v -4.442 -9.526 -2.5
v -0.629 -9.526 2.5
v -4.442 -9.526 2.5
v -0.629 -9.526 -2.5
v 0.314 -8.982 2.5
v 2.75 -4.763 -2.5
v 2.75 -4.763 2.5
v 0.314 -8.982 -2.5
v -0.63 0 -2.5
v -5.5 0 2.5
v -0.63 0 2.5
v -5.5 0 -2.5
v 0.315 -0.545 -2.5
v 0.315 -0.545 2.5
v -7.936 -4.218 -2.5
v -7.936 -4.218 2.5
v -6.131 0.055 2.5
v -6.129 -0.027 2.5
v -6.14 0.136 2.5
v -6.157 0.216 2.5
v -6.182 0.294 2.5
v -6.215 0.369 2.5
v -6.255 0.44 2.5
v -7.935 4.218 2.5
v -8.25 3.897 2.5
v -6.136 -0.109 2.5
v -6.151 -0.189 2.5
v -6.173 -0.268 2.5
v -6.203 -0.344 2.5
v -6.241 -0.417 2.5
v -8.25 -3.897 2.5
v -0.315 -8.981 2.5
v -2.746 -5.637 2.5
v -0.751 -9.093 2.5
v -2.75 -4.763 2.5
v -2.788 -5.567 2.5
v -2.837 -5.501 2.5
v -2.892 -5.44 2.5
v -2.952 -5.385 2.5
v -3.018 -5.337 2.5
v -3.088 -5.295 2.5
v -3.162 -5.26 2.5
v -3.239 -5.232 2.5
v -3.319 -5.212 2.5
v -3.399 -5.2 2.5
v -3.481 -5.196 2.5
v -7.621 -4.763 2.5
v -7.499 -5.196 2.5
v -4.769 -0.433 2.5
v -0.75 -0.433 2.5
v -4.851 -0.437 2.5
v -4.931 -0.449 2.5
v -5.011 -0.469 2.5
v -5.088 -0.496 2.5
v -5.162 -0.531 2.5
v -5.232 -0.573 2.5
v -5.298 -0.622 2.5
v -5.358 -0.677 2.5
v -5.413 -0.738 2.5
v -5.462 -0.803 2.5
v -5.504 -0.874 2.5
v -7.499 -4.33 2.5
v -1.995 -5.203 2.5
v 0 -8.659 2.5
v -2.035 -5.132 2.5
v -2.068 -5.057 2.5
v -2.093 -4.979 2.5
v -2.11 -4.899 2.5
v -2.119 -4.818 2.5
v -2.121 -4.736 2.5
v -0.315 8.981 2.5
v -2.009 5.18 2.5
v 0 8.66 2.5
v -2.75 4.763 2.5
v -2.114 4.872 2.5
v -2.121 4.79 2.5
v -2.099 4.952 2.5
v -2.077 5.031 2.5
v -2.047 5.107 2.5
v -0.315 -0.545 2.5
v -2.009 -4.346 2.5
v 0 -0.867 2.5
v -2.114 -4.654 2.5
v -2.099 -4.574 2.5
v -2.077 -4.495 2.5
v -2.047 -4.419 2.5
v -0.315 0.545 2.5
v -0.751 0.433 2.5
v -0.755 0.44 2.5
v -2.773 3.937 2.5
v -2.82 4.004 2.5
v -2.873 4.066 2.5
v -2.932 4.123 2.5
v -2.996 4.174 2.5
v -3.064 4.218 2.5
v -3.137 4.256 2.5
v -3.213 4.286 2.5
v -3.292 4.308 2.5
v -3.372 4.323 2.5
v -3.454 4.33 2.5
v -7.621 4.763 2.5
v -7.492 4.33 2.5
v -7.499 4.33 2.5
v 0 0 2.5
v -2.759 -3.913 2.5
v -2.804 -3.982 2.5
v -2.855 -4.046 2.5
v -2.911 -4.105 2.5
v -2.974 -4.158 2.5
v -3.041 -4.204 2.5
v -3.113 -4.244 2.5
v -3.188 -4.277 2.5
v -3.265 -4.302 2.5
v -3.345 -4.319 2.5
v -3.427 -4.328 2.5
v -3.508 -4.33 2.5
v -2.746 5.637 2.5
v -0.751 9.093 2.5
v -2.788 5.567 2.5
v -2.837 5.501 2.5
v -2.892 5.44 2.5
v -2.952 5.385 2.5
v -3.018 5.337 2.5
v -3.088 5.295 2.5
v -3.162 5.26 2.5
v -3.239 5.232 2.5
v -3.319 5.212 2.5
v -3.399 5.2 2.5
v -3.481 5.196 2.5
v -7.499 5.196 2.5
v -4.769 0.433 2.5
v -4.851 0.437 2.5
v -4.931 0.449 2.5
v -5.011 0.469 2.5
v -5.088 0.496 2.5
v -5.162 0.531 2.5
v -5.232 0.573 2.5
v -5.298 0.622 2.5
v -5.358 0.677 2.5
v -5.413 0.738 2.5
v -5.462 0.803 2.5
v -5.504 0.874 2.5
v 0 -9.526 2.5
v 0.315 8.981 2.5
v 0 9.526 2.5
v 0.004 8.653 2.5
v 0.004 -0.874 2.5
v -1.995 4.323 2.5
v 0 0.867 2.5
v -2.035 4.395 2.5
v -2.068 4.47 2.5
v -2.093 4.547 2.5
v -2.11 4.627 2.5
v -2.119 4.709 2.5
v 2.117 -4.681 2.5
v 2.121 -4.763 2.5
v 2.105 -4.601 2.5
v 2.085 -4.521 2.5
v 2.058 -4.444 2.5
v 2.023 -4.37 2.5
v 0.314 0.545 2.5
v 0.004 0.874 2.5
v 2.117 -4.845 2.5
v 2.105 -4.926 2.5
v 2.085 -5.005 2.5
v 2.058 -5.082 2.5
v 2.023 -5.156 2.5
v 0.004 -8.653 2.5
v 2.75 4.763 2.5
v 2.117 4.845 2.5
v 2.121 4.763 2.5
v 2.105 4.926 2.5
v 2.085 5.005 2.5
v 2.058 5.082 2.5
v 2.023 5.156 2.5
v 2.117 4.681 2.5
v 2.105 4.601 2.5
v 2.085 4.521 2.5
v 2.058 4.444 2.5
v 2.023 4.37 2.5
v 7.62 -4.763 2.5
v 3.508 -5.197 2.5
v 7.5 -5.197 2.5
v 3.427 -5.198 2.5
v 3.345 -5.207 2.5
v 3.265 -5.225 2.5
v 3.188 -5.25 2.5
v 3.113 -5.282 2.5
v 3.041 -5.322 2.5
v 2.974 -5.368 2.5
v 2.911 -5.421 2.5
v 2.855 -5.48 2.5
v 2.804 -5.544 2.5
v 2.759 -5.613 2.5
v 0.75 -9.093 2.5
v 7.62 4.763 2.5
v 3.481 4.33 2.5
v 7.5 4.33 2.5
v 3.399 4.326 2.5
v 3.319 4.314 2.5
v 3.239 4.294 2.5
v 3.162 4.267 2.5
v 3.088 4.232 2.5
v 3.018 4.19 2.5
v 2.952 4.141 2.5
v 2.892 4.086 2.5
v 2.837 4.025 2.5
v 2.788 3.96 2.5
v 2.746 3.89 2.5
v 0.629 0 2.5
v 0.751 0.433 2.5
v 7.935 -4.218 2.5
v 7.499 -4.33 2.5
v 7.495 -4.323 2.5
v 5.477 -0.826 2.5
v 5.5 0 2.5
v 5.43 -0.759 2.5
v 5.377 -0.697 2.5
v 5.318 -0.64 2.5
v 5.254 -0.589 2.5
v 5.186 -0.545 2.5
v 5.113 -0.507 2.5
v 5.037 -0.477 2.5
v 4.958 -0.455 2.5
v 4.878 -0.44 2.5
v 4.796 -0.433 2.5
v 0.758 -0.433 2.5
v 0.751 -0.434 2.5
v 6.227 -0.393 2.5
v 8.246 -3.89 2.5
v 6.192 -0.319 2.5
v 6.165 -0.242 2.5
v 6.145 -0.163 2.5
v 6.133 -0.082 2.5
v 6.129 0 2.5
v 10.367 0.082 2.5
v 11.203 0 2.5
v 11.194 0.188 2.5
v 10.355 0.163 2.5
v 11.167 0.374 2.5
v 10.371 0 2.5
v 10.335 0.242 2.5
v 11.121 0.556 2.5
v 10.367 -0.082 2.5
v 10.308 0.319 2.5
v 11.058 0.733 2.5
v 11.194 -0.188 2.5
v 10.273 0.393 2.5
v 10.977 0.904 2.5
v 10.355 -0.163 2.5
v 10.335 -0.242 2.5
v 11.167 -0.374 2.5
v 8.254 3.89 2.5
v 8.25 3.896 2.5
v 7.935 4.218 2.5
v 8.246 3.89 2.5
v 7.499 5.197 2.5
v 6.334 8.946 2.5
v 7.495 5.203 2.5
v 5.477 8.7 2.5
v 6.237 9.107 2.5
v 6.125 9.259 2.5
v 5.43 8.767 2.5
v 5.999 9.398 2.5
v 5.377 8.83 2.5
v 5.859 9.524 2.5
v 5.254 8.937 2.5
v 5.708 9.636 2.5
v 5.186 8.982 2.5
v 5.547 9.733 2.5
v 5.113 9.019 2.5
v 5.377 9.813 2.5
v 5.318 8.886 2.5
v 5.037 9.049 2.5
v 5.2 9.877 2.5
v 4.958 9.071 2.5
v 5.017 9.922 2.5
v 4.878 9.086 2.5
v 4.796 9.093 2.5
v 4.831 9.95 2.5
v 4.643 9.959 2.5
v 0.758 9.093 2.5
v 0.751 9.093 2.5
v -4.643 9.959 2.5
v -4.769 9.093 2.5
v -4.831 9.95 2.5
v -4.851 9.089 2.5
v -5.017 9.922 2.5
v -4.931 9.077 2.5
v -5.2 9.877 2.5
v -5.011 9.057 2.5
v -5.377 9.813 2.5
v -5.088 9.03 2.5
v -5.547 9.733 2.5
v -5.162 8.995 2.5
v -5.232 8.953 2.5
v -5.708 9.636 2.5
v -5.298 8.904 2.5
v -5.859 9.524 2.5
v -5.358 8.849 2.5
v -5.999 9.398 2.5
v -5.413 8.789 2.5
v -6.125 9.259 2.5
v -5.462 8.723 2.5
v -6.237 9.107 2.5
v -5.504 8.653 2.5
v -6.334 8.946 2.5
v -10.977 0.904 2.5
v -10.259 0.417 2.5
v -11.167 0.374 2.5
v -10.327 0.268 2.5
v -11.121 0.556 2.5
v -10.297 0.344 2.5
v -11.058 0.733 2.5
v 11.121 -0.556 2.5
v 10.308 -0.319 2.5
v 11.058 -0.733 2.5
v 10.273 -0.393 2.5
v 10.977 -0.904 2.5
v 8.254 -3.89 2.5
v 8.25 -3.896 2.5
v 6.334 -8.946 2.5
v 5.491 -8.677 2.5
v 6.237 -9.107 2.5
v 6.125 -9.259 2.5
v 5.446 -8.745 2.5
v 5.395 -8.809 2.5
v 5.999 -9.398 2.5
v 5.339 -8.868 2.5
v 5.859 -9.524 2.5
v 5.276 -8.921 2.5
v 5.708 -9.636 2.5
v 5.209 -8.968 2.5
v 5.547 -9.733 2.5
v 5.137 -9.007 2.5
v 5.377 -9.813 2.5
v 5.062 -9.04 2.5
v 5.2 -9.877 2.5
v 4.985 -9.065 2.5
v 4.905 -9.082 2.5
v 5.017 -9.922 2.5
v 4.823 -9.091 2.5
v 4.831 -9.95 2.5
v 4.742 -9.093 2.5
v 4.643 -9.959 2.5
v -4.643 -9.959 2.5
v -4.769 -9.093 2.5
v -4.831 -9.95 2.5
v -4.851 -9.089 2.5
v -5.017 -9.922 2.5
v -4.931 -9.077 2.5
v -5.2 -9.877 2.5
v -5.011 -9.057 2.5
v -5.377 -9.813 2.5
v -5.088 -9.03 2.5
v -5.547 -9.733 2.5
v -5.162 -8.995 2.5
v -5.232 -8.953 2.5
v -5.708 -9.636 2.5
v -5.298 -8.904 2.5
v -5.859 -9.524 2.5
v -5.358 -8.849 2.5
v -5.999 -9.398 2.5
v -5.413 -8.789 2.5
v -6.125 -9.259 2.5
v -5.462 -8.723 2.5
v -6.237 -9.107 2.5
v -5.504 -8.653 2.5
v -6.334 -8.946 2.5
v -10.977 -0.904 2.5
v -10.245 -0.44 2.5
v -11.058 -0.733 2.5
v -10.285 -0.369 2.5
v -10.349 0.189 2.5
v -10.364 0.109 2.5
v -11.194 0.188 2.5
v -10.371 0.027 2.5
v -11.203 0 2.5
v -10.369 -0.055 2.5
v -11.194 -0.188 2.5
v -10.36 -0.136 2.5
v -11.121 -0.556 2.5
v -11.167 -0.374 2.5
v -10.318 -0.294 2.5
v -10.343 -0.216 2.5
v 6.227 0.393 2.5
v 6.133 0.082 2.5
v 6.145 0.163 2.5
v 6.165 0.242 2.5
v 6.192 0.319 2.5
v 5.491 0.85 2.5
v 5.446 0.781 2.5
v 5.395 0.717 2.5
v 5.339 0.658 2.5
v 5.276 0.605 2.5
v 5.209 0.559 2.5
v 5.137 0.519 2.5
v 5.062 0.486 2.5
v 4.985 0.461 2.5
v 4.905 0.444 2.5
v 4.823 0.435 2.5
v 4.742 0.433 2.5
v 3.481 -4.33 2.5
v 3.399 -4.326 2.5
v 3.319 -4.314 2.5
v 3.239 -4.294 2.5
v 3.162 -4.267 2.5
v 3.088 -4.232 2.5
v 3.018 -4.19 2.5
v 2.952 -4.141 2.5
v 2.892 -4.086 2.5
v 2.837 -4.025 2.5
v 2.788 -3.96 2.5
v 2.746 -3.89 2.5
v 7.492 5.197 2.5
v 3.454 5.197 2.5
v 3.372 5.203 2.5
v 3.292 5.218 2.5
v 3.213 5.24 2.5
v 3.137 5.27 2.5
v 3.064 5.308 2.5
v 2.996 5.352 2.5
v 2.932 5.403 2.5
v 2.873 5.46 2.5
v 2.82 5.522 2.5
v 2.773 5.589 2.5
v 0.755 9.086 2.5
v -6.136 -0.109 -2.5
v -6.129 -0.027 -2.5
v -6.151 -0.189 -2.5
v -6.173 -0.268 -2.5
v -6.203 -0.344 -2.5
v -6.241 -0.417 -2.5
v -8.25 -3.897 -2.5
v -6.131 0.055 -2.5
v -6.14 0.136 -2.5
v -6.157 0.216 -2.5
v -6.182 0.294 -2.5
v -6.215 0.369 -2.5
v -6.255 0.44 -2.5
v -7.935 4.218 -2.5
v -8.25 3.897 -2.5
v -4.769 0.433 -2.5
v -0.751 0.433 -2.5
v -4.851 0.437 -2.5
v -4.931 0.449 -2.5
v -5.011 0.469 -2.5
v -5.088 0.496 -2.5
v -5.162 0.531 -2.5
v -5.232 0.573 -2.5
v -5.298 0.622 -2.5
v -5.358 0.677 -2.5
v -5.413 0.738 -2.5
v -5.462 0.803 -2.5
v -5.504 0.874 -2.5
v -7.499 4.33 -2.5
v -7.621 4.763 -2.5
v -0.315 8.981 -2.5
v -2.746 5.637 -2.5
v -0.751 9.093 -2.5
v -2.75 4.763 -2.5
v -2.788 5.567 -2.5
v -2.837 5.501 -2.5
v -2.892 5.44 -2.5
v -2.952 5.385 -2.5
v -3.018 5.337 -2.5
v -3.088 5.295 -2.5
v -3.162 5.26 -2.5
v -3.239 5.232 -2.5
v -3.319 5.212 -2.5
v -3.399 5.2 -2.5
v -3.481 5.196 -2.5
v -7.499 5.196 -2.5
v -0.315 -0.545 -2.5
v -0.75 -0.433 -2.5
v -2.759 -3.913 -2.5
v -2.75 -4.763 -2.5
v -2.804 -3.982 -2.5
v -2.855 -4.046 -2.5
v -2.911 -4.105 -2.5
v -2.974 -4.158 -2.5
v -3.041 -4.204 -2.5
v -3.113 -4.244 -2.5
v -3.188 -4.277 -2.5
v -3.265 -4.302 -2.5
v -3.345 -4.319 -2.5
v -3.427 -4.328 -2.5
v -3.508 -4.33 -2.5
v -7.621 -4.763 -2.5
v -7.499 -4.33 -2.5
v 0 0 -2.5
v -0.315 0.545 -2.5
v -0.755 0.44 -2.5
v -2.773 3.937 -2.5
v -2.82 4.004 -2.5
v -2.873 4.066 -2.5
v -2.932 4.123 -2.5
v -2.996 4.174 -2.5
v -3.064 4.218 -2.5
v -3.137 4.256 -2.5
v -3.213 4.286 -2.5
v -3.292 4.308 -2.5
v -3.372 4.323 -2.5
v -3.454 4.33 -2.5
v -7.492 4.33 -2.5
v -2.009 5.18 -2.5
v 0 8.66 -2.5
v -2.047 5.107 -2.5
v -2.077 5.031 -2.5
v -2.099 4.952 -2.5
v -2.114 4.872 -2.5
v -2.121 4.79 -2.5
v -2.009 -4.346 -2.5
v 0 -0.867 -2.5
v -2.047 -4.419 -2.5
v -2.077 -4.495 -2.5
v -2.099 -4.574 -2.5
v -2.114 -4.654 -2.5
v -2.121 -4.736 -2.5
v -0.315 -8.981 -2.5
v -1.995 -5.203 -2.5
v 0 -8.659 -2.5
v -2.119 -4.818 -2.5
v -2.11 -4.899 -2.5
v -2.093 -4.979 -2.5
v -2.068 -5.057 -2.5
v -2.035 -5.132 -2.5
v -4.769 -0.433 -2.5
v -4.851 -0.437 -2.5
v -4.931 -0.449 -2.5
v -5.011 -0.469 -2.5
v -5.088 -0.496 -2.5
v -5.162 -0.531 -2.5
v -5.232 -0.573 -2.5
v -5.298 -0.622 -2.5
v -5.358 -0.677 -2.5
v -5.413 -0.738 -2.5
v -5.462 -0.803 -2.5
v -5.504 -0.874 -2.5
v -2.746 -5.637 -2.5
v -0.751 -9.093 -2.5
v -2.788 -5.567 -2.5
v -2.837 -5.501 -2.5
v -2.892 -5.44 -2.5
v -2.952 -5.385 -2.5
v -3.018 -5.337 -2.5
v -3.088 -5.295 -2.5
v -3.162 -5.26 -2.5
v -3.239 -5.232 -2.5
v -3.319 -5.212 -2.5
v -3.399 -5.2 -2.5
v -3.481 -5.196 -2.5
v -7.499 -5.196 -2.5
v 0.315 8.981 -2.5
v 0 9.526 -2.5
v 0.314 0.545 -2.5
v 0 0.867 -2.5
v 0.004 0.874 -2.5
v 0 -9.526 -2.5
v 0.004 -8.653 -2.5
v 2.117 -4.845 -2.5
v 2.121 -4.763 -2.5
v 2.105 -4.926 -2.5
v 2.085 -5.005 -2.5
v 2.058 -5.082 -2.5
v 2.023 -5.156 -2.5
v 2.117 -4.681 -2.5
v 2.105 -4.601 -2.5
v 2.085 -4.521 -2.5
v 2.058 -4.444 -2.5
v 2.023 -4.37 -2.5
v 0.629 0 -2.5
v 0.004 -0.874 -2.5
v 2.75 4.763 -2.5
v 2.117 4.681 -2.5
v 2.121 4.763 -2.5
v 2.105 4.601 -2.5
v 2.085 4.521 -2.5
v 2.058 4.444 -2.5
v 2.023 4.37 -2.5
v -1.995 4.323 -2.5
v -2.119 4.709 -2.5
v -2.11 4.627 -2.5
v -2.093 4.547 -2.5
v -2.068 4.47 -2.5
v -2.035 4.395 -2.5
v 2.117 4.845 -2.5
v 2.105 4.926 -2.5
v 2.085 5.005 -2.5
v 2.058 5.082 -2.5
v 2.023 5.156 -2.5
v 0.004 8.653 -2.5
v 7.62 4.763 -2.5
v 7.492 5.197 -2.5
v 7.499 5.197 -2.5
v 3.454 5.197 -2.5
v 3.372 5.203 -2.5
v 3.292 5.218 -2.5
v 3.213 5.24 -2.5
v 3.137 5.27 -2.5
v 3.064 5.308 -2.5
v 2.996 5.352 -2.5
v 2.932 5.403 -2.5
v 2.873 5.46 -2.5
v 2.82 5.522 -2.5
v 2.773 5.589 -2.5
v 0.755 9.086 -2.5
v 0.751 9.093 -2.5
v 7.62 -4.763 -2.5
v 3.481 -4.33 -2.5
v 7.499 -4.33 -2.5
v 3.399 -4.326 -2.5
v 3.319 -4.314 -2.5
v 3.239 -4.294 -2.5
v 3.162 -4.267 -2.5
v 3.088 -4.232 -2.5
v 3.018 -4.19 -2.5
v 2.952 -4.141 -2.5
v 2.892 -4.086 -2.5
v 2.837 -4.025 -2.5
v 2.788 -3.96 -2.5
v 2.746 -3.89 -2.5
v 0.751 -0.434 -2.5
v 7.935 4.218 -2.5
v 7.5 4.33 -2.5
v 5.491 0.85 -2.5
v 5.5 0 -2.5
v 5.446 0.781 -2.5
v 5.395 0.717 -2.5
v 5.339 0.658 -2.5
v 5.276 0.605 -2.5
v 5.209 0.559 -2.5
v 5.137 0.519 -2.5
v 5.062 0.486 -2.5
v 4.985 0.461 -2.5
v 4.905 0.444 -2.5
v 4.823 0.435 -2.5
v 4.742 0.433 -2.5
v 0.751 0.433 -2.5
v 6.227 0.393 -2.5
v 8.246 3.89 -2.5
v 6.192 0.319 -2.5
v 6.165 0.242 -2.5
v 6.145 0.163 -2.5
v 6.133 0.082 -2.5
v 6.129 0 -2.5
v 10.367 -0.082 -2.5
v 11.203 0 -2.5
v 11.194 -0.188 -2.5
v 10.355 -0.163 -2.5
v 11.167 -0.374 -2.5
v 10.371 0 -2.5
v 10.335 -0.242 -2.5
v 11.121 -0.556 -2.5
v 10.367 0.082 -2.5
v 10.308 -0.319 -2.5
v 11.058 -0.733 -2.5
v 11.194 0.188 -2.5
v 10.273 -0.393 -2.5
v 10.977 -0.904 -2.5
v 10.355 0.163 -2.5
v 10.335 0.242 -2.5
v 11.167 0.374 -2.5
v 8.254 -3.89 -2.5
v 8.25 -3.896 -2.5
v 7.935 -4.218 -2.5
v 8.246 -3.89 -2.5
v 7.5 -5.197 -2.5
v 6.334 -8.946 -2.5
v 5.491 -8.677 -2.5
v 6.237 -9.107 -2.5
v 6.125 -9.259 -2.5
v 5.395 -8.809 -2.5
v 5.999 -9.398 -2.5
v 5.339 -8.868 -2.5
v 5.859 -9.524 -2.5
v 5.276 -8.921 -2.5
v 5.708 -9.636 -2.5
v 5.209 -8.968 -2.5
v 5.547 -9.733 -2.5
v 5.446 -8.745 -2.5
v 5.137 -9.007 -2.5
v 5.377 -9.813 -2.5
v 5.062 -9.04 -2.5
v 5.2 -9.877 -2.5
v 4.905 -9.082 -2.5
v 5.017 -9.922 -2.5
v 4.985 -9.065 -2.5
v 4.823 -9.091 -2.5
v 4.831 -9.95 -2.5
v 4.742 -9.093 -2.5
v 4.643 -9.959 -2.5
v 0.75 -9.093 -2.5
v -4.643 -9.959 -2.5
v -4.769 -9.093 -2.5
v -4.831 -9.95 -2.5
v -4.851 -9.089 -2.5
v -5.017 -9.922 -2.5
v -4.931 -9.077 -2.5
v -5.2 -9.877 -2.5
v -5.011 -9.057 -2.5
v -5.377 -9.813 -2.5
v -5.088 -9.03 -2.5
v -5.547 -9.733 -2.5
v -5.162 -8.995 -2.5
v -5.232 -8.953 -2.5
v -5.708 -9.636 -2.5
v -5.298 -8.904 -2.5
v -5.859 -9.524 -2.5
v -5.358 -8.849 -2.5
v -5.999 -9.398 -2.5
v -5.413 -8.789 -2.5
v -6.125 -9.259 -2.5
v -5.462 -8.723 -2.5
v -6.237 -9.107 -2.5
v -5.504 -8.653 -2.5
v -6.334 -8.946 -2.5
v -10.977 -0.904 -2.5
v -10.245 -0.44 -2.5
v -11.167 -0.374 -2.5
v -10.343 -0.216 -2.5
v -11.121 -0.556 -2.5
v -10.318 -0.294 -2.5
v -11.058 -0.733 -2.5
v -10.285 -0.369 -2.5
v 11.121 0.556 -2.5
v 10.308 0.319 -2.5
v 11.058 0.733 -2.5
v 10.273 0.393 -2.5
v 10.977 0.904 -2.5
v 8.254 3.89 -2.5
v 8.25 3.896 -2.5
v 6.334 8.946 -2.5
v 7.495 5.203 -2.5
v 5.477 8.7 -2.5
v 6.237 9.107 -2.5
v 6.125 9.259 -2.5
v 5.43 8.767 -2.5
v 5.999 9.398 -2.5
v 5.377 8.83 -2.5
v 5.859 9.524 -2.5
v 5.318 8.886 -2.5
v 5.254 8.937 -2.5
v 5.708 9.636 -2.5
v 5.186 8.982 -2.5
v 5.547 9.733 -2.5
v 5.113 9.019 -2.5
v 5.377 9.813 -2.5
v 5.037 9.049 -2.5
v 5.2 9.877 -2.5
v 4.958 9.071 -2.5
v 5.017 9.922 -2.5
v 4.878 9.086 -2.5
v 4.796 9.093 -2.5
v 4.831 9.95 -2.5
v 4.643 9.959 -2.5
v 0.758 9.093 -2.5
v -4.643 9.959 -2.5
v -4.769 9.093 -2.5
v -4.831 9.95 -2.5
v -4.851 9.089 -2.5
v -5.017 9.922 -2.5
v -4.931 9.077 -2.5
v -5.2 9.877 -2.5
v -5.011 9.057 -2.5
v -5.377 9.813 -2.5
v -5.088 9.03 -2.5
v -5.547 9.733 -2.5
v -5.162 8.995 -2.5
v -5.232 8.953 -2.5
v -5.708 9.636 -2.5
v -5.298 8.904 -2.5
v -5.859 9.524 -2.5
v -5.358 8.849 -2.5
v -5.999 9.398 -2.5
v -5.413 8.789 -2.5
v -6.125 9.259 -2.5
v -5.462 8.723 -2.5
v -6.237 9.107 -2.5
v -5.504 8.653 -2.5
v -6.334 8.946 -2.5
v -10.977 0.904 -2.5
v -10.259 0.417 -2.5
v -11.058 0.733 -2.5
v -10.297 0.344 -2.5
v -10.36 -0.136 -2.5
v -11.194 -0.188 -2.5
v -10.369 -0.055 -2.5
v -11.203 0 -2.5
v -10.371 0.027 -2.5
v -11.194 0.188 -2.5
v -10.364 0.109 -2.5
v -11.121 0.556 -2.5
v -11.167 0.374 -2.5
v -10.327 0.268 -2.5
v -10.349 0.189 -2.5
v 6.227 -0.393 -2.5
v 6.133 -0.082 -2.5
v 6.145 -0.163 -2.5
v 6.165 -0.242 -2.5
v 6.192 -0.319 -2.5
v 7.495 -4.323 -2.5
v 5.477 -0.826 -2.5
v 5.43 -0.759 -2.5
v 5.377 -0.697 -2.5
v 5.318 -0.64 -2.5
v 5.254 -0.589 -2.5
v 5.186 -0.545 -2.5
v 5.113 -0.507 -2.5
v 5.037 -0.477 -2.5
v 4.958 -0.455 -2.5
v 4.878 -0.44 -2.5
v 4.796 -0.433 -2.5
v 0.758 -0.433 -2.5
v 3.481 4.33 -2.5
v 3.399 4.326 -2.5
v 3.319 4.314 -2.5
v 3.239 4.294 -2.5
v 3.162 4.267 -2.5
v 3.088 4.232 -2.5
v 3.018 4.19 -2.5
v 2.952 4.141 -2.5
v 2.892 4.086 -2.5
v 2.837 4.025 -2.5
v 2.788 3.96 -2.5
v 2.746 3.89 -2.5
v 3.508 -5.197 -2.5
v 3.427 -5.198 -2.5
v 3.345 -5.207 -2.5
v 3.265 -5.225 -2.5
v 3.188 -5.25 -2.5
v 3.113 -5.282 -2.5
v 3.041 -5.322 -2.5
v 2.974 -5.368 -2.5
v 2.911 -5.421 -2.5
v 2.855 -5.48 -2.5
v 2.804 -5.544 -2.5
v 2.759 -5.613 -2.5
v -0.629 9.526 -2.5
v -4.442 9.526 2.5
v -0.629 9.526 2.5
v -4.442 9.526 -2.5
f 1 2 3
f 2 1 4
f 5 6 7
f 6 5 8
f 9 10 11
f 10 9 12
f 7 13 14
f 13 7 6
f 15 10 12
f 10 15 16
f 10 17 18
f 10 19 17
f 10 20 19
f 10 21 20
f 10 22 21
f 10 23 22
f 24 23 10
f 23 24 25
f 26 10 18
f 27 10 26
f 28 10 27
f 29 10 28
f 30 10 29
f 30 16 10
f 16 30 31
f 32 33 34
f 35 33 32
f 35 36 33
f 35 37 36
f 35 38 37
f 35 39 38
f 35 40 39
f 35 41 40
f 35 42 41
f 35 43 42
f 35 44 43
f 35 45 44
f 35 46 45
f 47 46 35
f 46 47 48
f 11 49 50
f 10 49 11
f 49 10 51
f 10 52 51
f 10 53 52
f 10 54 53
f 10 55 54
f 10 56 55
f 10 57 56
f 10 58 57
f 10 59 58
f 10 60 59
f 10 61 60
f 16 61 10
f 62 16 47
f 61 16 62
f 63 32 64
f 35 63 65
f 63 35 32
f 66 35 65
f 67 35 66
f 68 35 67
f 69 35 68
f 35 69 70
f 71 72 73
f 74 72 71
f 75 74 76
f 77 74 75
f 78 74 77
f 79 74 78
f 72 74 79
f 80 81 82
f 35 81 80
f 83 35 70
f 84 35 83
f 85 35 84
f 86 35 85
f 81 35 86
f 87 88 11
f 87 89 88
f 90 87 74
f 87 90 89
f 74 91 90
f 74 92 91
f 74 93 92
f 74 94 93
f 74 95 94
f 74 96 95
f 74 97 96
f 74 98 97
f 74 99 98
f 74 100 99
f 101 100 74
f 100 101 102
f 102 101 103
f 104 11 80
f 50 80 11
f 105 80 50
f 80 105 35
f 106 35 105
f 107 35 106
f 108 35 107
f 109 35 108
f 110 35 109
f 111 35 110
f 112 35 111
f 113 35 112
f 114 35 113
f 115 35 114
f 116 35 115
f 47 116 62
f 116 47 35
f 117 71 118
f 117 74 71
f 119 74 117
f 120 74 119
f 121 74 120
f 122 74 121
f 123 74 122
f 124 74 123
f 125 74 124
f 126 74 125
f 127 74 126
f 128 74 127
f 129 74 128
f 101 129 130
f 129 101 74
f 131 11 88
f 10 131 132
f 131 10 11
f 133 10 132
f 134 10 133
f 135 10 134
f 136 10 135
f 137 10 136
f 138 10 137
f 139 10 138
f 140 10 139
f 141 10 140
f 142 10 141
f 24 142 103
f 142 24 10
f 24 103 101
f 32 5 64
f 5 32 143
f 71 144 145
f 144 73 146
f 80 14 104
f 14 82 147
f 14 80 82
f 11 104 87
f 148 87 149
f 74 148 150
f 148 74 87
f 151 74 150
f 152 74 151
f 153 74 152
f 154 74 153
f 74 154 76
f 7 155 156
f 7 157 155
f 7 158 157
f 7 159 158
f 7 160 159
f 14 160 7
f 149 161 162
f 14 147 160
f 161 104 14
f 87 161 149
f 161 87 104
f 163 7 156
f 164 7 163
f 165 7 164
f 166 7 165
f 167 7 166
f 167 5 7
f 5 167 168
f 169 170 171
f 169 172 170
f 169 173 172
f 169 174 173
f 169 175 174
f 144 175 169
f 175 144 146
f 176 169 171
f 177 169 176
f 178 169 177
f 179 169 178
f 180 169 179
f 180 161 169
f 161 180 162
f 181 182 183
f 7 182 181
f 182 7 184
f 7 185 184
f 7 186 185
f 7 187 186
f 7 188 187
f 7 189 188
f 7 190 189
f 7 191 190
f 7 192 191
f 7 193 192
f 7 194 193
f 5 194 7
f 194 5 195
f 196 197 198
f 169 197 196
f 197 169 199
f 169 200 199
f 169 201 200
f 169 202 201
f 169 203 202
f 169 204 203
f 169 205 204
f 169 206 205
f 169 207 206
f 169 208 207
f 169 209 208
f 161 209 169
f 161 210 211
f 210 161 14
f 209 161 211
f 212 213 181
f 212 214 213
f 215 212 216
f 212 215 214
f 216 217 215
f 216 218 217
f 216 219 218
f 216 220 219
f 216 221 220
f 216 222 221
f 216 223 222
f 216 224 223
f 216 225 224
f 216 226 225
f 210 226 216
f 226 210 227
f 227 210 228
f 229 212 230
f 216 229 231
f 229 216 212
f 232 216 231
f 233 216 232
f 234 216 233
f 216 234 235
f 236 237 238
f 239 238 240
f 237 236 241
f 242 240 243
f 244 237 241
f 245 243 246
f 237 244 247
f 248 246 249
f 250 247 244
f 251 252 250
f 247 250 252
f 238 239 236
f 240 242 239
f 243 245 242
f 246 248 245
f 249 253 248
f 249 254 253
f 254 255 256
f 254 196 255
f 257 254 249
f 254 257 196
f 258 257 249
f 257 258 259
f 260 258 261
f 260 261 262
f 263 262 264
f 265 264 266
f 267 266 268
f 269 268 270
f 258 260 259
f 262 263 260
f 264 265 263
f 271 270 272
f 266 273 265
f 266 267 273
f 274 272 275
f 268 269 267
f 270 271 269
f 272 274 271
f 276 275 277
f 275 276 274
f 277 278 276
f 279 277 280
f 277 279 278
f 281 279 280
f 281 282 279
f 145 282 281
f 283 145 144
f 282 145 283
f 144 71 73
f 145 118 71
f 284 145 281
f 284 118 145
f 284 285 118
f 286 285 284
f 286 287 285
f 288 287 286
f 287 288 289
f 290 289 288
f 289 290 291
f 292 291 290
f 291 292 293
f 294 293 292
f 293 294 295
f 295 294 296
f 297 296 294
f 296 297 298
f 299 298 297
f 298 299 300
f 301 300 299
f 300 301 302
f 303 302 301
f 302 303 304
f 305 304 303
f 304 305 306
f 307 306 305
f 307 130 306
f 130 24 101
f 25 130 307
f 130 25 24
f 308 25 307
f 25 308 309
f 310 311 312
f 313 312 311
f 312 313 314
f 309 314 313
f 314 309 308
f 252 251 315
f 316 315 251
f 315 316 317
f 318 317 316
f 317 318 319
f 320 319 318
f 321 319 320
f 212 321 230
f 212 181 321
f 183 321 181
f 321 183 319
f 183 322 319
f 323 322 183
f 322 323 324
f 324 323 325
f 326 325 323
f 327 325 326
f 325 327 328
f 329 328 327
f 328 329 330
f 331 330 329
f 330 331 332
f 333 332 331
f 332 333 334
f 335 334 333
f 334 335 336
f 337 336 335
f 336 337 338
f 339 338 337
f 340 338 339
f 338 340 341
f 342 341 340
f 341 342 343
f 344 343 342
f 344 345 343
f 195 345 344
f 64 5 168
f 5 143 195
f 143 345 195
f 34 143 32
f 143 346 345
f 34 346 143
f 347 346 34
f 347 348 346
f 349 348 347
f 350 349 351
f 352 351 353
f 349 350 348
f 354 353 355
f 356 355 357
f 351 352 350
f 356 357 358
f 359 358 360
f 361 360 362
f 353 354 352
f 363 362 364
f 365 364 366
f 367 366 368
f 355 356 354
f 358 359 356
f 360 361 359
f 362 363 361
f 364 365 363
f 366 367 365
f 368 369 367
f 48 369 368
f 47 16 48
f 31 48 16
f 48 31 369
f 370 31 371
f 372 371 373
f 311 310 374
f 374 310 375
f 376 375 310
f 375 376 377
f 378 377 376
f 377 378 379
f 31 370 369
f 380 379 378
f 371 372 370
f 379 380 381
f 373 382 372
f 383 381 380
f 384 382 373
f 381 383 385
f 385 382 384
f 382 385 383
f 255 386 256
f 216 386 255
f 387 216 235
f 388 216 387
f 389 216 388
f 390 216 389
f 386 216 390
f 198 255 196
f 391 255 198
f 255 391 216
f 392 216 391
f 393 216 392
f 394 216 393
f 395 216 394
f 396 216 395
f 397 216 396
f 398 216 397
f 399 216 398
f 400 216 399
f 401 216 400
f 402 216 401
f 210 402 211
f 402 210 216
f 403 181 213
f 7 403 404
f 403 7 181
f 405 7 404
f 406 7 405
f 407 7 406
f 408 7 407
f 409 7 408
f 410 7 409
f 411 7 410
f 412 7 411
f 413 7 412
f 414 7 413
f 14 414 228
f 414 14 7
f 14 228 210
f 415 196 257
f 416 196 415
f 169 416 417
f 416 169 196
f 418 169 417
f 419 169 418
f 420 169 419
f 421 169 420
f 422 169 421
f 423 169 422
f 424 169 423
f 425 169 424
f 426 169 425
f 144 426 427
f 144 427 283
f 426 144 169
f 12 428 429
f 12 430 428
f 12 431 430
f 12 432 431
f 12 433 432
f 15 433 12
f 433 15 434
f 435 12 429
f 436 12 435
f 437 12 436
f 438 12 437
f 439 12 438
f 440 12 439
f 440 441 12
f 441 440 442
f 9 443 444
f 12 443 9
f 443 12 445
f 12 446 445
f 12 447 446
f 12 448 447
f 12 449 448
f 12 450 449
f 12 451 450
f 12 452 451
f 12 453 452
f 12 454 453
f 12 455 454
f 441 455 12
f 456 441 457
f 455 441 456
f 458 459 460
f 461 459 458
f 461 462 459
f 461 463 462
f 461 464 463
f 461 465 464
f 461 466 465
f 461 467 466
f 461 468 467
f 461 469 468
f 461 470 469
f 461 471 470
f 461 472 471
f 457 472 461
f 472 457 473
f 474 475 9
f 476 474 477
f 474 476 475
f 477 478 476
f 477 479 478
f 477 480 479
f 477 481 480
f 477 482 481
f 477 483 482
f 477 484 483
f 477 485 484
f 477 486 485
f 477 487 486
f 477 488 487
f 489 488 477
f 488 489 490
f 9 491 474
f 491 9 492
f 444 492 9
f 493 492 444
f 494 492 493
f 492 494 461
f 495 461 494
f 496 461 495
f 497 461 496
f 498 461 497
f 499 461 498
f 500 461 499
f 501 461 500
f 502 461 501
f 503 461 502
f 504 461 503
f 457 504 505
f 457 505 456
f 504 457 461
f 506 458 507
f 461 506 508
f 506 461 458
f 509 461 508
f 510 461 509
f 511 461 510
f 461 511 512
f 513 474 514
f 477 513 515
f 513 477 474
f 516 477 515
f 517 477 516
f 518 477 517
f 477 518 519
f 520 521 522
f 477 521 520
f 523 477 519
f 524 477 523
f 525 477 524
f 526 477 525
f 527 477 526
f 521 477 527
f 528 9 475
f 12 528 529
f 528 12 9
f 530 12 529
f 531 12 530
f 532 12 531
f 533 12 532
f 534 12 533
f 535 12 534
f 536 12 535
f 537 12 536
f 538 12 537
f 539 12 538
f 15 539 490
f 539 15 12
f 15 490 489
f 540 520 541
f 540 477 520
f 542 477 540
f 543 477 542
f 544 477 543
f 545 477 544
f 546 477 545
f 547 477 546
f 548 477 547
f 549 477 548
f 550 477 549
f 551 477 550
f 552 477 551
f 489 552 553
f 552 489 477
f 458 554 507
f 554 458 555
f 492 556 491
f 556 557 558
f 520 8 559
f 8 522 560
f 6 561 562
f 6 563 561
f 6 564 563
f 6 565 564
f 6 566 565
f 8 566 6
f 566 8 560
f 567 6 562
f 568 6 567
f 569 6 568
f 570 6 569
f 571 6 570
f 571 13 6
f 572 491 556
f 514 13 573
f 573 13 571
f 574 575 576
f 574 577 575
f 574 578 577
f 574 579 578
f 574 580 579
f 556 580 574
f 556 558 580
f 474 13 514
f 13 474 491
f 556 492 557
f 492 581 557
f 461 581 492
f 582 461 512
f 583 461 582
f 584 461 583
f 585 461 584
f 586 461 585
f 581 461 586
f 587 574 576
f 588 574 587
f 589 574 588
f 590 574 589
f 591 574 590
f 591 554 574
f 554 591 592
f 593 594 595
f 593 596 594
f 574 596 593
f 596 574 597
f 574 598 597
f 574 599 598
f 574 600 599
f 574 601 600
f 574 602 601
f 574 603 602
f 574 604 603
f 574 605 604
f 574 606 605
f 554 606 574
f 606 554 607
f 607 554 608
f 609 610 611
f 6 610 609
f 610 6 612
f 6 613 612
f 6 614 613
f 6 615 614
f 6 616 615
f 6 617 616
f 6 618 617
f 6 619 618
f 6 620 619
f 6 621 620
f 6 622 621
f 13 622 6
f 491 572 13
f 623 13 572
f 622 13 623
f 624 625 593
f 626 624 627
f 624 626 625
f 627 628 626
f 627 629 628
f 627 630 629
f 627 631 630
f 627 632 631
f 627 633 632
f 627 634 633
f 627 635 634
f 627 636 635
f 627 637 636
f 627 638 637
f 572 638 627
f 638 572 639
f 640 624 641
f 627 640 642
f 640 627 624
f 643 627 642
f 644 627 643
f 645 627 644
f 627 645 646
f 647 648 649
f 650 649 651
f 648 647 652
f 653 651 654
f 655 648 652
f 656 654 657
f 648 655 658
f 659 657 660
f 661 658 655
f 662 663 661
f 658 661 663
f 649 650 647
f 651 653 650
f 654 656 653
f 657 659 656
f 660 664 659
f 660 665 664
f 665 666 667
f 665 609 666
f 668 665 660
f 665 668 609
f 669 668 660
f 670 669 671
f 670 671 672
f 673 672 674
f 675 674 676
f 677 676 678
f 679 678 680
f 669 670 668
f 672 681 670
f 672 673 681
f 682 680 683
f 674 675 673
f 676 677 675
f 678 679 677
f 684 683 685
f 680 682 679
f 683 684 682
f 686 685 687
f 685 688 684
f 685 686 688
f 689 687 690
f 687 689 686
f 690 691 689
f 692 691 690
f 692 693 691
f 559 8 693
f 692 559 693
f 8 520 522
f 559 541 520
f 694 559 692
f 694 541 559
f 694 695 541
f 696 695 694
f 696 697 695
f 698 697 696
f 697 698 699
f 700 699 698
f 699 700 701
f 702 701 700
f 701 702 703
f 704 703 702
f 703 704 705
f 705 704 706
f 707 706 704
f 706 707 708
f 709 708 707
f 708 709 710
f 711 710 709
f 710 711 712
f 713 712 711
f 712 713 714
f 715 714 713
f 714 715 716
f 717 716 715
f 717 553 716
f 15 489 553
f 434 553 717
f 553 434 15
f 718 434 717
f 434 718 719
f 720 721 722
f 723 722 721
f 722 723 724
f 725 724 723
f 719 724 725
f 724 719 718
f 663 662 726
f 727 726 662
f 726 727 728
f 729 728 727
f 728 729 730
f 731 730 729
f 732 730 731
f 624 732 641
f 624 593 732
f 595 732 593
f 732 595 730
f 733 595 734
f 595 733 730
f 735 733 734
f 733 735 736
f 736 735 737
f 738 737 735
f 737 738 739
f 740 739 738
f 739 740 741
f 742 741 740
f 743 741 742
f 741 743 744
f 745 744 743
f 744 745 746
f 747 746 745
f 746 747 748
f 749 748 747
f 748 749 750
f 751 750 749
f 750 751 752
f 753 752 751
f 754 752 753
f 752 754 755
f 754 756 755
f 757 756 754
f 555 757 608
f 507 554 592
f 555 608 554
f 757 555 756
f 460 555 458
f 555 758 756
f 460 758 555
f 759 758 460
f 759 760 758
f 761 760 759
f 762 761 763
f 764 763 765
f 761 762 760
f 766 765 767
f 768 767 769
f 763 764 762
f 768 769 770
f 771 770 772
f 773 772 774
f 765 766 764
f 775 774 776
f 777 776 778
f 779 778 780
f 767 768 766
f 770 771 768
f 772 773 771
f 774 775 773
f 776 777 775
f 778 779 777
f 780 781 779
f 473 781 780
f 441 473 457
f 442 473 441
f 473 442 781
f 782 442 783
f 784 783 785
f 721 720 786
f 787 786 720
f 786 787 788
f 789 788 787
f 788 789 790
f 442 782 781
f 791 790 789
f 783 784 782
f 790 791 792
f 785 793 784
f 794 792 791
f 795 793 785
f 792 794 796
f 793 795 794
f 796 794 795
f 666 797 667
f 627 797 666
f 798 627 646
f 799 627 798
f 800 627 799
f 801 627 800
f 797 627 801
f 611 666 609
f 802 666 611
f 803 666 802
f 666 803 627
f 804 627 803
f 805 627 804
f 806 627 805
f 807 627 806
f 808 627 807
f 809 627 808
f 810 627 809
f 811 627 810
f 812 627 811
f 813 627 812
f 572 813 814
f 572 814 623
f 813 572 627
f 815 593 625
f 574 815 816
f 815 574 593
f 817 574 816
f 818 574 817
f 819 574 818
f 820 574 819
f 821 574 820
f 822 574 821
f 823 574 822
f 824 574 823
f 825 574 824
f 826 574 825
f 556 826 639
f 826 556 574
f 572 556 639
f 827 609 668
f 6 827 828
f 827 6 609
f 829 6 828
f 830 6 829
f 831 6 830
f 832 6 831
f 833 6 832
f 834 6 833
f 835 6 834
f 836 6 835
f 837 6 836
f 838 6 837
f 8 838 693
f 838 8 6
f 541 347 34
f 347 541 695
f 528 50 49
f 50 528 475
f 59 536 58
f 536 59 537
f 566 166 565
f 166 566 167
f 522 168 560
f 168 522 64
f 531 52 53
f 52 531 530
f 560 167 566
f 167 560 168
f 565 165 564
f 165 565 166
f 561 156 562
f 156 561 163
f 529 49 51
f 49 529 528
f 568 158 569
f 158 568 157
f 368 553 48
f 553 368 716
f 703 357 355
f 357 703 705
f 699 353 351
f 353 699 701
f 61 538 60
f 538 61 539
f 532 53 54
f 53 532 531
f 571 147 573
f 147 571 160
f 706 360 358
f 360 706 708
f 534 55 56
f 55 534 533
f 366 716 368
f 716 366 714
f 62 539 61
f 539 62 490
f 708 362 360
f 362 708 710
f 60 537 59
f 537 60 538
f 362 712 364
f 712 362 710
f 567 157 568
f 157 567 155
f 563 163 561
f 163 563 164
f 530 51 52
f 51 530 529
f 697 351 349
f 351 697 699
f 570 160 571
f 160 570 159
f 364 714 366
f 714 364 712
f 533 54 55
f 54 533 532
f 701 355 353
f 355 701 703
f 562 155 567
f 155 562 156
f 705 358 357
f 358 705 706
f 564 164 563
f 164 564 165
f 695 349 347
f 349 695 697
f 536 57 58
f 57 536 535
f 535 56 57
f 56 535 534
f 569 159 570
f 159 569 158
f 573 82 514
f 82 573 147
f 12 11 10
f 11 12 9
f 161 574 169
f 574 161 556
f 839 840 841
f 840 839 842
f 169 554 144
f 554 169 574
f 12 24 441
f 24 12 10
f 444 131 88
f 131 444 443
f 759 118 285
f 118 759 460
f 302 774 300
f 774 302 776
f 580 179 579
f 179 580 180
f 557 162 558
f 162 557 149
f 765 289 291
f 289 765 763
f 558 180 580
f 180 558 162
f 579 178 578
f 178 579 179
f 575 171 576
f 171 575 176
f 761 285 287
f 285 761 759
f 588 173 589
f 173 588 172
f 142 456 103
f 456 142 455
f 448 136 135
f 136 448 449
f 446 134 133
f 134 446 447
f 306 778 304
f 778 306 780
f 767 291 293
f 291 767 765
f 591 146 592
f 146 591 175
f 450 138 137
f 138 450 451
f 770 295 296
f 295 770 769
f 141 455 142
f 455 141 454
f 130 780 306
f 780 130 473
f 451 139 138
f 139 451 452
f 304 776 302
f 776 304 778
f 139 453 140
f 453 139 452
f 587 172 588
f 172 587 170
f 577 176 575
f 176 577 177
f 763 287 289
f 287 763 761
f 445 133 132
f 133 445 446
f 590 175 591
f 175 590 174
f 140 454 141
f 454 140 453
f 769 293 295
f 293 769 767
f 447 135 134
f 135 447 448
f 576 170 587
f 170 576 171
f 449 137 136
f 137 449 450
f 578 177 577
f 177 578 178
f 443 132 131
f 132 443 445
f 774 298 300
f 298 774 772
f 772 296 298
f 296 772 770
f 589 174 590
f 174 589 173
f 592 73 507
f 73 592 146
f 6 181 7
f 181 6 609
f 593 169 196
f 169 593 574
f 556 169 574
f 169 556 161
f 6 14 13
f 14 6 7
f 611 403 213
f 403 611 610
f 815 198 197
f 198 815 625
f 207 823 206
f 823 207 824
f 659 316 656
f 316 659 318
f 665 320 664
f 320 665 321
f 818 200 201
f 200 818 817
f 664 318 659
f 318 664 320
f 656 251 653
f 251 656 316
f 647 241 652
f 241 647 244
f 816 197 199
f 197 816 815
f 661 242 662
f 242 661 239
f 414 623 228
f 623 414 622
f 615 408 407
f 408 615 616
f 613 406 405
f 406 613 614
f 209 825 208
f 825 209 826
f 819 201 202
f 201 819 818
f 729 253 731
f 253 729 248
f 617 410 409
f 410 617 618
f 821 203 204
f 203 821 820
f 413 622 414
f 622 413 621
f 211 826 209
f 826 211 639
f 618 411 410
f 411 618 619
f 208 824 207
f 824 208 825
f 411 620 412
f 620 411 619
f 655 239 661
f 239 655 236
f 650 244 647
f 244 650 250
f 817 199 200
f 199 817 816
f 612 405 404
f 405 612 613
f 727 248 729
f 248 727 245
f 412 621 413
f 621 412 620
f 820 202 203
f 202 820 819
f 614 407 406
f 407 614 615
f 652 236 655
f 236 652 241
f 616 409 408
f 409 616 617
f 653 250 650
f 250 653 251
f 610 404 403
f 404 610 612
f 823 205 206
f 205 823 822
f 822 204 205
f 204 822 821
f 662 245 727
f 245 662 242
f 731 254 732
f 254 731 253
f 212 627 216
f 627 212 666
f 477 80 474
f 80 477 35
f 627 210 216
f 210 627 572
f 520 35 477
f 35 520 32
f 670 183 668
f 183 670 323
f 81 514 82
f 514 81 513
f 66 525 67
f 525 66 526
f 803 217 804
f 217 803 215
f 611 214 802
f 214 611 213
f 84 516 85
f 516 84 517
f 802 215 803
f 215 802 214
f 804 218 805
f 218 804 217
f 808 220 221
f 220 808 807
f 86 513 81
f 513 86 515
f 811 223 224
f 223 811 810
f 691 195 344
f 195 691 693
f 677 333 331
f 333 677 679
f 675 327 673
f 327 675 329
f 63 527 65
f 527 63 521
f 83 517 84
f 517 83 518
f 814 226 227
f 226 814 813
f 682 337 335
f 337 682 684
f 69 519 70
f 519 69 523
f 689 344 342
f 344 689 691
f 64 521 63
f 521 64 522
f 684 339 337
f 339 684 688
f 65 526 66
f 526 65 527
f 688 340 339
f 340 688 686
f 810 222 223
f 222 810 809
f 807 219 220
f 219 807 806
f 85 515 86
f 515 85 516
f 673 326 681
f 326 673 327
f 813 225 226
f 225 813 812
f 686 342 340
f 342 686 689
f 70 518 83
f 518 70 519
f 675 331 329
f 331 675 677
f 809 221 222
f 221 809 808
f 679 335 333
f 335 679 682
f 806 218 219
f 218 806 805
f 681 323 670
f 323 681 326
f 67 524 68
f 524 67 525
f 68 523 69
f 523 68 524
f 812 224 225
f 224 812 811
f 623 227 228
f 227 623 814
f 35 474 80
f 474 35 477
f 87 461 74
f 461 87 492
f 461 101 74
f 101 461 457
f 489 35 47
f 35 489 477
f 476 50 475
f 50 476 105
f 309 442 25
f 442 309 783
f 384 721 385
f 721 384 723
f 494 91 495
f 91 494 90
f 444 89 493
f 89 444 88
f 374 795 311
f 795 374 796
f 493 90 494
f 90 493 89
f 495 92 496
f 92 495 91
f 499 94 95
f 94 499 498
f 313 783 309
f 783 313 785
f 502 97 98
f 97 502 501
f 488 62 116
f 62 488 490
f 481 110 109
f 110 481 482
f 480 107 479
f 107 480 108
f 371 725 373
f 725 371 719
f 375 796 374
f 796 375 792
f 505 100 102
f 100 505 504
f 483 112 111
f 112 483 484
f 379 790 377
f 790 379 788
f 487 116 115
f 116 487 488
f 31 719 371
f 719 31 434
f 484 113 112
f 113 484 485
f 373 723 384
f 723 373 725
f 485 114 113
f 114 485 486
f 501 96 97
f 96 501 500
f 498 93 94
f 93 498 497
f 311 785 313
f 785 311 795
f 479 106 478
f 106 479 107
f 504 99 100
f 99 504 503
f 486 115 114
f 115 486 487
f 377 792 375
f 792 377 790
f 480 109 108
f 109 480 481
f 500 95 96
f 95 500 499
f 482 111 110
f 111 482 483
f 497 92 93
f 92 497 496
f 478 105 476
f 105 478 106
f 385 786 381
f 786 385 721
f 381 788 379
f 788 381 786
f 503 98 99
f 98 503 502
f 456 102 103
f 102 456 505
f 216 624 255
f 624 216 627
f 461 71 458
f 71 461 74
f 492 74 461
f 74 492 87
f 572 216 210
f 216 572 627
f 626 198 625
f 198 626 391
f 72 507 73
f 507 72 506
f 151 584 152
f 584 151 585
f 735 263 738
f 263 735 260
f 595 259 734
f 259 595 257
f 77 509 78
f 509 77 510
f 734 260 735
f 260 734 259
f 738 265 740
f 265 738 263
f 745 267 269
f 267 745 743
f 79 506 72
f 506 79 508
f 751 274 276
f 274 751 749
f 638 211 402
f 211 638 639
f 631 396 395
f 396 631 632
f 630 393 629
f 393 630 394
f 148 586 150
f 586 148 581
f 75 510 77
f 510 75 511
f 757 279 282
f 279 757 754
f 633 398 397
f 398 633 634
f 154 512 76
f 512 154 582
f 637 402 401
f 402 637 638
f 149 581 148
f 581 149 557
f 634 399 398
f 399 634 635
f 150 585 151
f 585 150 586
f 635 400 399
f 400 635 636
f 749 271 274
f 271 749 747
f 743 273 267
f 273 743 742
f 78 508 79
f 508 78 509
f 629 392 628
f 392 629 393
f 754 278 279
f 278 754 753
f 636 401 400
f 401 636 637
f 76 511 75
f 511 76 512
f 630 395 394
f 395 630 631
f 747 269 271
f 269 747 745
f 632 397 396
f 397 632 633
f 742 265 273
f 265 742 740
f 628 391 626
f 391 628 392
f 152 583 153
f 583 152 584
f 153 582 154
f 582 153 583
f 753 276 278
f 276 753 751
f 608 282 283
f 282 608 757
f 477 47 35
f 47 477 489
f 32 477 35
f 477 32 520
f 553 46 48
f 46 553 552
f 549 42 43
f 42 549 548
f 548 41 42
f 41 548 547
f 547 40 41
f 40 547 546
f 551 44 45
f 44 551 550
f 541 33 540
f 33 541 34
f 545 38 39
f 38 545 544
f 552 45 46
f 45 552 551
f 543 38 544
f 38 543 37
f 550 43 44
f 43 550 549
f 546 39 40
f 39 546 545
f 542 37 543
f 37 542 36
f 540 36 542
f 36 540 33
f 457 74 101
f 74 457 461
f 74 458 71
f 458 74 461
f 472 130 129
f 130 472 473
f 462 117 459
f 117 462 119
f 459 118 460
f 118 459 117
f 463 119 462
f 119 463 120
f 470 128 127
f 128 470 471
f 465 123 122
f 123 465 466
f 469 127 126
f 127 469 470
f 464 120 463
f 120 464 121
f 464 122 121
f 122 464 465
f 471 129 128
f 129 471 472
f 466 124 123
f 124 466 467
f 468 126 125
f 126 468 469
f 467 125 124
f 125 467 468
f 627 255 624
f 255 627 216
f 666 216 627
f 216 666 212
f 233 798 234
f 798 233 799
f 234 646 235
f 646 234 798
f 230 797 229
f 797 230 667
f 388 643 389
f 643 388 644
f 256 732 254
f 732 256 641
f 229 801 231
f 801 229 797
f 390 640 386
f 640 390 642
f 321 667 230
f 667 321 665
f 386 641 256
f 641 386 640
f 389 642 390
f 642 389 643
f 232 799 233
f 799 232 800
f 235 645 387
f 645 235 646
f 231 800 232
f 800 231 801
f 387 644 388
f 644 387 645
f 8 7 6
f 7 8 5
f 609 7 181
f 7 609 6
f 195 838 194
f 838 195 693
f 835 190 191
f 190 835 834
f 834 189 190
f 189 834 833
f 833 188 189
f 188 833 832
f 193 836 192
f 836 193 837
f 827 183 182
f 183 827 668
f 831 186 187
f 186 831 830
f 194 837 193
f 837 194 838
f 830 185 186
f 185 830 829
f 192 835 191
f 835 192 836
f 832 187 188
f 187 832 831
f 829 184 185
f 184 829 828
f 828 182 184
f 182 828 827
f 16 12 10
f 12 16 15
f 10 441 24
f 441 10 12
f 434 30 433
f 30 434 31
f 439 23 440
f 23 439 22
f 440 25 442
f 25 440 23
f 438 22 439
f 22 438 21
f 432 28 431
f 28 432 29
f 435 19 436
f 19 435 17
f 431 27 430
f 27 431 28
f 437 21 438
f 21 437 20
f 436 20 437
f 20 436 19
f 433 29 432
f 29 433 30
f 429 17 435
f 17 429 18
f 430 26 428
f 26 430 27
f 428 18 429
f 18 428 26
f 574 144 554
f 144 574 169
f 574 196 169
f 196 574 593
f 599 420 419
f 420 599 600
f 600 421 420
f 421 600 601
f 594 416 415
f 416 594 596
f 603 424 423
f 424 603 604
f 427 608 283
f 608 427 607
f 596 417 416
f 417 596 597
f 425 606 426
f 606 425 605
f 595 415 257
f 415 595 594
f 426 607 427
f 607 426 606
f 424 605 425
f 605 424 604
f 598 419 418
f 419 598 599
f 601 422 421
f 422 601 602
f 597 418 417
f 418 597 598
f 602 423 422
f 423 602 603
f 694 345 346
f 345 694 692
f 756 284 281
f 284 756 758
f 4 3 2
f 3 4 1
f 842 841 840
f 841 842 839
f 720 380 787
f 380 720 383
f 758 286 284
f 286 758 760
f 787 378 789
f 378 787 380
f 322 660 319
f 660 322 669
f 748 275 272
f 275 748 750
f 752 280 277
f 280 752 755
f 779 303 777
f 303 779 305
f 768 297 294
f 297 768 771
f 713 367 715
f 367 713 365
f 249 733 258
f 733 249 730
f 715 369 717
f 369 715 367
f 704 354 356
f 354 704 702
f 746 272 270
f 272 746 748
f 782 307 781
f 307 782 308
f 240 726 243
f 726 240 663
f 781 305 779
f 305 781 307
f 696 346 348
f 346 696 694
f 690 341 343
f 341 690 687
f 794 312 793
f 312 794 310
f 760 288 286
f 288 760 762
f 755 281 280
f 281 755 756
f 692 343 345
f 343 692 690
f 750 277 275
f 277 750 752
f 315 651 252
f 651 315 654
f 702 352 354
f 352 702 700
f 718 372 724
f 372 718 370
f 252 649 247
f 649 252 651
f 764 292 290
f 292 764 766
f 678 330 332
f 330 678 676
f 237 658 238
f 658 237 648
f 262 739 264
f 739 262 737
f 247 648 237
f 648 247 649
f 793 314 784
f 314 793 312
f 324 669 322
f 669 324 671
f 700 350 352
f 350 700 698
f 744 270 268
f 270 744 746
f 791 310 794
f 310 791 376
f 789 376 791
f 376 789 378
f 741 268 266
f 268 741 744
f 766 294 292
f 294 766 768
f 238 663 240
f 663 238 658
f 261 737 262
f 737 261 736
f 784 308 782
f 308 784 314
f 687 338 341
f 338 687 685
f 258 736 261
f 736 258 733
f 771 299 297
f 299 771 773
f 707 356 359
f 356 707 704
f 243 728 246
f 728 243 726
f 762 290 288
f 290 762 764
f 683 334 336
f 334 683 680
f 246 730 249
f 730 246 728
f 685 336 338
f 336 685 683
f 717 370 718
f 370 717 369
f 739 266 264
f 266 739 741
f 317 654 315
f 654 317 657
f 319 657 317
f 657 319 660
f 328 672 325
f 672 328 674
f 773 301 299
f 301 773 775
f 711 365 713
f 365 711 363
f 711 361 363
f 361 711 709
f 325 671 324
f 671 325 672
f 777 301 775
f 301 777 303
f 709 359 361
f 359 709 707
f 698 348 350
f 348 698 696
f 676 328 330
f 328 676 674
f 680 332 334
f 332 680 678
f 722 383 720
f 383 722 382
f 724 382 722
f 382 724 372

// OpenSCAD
//---------------------------------------------------------------
//-- Openscad Ventilation Flake in Cool PCB Enclosure (http://www.thingiverse.com/thing:1665075).
//-- Version: 1.0
//-- Jul-2016
//---------------------------------------------------------------
//-- Released under the GPL3 license
//---------------------------------------------------------------

//----------------------------------------
//-- FUNCTIONS
//----------------------------------------

//-- Calculate the module of a vector
function mod(v) = (sqrt(v[0]*v[0]+v[1]*v[1]+v[2]*v[2]));

//-- Calculate the cros product of two vectors
function cross(u,v) = [
  u[1]*v[2] - v[1]*u[2],
  -(u[0]*v[2] - v[0]*u[2]) ,
  u[0]*v[1] - v[0]*u[1]];

//-- Calculate the dot product of two vectors
function dot(u,v) = u[0]*v[0]+u[1]*v[1]+u[2]*v[2];

//-- Return the unit vector of a vector
function unitv(v) = v/mod(v);

//-- Return the angle between two vectores
function anglev(u, v) = acos( dot(u,v) / (mod(u)*mod(v)) );

function distance(u, v) = mod(v - u);

function incenter(A, B, C) = (A * distance(B, C) + B * distance(C, A) + C * distance(A, B)) / (distance(B, C) + distance(C, A) + distance(A, B));

function roundvertex(A, B, C, r) = B + (unitv(incenter(A, B, C) - B) * r / sin(anglev(B - A, B - C)/2)); 

function square_vertices(x, y) = [[-x/2, -y/2, 0], [-x/2, y/2, 0], [x/2, y/2, 0], [x/2, -y/2, 0]];

function trapezoid_vertex(long_base, height, short_base, base_height) = [[-long_base/2, -height/2, 0], [-long_base/2, - height/2 + base_height, 0], [-short_base/2, height/2, 0], [short_base/2, height/2, 0], [long_base/2, - height/2 + base_height, 0], [long_base/2, -height/2, 0]];

function hexagon_vertices(r) = [[r * cos(2 * 180 * 0 / 6), r * sin(2 * 180 * 0/6), 0], [r * cos(2 * 180 * 1/6), r * sin(2 * 180 * 1/6), 0], [r * cos(2 * 180 * 2/6), r * sin(2 * 180 * 2/6), 0], [r * cos(2 * 180 * 3/6), r * sin(2 * 180 * 3/6), 0], [r * cos(2 * 180 * 4/6), r * sin(2 * 180 * 4/6), 0], [r * cos(2 * 180 * 5/6), r * sin(2 * 180 * 5/6), 0]];


//---------------------------------------------------------------
//-- MODULES
//---------------------------------------------------------------

module rounded_polig4(box, radius) {
    length = box[0];
    width = box[1];
    height = box[2];
	vertices = square_vertices(height, width);
    
    A = vertices[0];
	B = vertices[1];
	C = vertices[2];
	D = vertices[3];

	rotate([0, 90, 90]) translate([0, 0, -length/2]) linear_extrude(height = length, $fn = 64)
	hull() {
		// place 4 circles in the corners, with the given radius
		translate(roundvertex(A, B, C, radius)) circle(r = radius, center = true);
		translate(roundvertex(B, C, D, radius)) circle(r = radius, center = true);
		translate(roundvertex(C, D, A, radius)) circle(r = radius, center = true);
		translate(roundvertex(D, A, B, radius)) circle(r = radius, center = true);
	} //hu
} //mo


// polig6 - [x,y,z]
// radius - radius of corners
module rounded_polig6(polig6, height, radius) {
	A = polig6[0];
	B = polig6[1];
	C = polig6[2];
	D = polig6[3];
	E = polig6[4];
	F = polig6[5];

	linear_extrude(height = height, center= true, $fn = 64)
	hull() {
		// place 4 circles in the corners, with the given radius
		translate(roundvertex(A, B, C, radius)) circle(r = radius, center = true);
		translate(roundvertex(B, C, D, radius)) circle(r = radius, center = true);
		translate(roundvertex(C, D, E, radius)) circle(r = radius, center = true);
		translate(roundvertex(D, E, F, radius)) circle(r = radius, center = true);
		translate(roundvertex(E, F, A, radius)) circle(r = radius, center = true);
		translate(roundvertex(F, A, B, radius)) circle(r = radius, center = true);
	} //hu
} //mo

module hex_cell(d, t, h) { //diameter, thick, height
  difference(){
    cylinder(d = d + t, h = h, center = true, $fn = 6);
    cylinder(d = d, h = h + 0.001, center = true, $fn = 6);
  } //di
  difference(){
  rounded_polig6(hexagon_vertices(r = (d + t)/2), height = h, radius = d/12);
  rounded_polig6(hexagon_vertices(r = d/2), height = h, radius = d/12);
  } //di
} //mo


module out_tricell(diameter, thickness, height) {
  translate([-(diameter + thickness) * cos(60), -(diameter + thickness)*sin(60), 0])
    hex_cell(d = diameter, t = thickness, h = height);
  translate([-(diameter + thickness) * cos(60), (diameter + thickness)*sin(60), 0])
    hex_cell(d = diameter, t = thickness, h = height);
  translate([(diameter + thickness) * 2*cos(60), 0, 0])
    hex_cell(d = diameter, t = thickness, h = height);
} //mo


module tricell(diameter, thickness, height) {
  translate([-(diameter + thickness)/2 * cos(60), -(diameter + thickness)/2*sin(60), 0])
    hex_cell(d = diameter, t = thickness, h = height);
  translate([-(diameter + thickness)/2 * cos(60), (diameter + thickness)/2*sin(60), 0])
    hex_cell(d = diameter, t = thickness, h = height);
  translate([(diameter + thickness) * cos(60), 0, 0])
    hex_cell(d = diameter, t = thickness, h = height);
} //mo

module ventilation_flake(diameter, thickness, height) {
  intersection() {
    union(){
      tricell(diameter, thickness, height);
      rotate ([0, 0, 60]) 
        tricell(diameter, thickness, height);
      out_tricell(diameter, thickness, height);
      rotate ([0, 0, 60]) 
        out_tricell(diameter, thickness, height);
      hex_cell(d = 2*(diameter + thickness), t = thickness, h = height);
    } //un
//    cylinder(d = 2*(diameter + thick)+ thick, h = height, center = true, $fn = 6);
    rounded_polig6(hexagon_vertices(r = (diameter + thickness)+ thickness/2), height = height, radius = ((diameter + thickness)+ thickness/2)/6);
  } //in
} //mo



//---------------------------------------------------------------
//-- RENDERS
//---------------------------------------------------------------
flake_dia = 10;
flake_thick = 1;
flake_height = 5;

ventilation_flake(diameter = flake_dia, thickness = flake_thick, height = flake_height);
